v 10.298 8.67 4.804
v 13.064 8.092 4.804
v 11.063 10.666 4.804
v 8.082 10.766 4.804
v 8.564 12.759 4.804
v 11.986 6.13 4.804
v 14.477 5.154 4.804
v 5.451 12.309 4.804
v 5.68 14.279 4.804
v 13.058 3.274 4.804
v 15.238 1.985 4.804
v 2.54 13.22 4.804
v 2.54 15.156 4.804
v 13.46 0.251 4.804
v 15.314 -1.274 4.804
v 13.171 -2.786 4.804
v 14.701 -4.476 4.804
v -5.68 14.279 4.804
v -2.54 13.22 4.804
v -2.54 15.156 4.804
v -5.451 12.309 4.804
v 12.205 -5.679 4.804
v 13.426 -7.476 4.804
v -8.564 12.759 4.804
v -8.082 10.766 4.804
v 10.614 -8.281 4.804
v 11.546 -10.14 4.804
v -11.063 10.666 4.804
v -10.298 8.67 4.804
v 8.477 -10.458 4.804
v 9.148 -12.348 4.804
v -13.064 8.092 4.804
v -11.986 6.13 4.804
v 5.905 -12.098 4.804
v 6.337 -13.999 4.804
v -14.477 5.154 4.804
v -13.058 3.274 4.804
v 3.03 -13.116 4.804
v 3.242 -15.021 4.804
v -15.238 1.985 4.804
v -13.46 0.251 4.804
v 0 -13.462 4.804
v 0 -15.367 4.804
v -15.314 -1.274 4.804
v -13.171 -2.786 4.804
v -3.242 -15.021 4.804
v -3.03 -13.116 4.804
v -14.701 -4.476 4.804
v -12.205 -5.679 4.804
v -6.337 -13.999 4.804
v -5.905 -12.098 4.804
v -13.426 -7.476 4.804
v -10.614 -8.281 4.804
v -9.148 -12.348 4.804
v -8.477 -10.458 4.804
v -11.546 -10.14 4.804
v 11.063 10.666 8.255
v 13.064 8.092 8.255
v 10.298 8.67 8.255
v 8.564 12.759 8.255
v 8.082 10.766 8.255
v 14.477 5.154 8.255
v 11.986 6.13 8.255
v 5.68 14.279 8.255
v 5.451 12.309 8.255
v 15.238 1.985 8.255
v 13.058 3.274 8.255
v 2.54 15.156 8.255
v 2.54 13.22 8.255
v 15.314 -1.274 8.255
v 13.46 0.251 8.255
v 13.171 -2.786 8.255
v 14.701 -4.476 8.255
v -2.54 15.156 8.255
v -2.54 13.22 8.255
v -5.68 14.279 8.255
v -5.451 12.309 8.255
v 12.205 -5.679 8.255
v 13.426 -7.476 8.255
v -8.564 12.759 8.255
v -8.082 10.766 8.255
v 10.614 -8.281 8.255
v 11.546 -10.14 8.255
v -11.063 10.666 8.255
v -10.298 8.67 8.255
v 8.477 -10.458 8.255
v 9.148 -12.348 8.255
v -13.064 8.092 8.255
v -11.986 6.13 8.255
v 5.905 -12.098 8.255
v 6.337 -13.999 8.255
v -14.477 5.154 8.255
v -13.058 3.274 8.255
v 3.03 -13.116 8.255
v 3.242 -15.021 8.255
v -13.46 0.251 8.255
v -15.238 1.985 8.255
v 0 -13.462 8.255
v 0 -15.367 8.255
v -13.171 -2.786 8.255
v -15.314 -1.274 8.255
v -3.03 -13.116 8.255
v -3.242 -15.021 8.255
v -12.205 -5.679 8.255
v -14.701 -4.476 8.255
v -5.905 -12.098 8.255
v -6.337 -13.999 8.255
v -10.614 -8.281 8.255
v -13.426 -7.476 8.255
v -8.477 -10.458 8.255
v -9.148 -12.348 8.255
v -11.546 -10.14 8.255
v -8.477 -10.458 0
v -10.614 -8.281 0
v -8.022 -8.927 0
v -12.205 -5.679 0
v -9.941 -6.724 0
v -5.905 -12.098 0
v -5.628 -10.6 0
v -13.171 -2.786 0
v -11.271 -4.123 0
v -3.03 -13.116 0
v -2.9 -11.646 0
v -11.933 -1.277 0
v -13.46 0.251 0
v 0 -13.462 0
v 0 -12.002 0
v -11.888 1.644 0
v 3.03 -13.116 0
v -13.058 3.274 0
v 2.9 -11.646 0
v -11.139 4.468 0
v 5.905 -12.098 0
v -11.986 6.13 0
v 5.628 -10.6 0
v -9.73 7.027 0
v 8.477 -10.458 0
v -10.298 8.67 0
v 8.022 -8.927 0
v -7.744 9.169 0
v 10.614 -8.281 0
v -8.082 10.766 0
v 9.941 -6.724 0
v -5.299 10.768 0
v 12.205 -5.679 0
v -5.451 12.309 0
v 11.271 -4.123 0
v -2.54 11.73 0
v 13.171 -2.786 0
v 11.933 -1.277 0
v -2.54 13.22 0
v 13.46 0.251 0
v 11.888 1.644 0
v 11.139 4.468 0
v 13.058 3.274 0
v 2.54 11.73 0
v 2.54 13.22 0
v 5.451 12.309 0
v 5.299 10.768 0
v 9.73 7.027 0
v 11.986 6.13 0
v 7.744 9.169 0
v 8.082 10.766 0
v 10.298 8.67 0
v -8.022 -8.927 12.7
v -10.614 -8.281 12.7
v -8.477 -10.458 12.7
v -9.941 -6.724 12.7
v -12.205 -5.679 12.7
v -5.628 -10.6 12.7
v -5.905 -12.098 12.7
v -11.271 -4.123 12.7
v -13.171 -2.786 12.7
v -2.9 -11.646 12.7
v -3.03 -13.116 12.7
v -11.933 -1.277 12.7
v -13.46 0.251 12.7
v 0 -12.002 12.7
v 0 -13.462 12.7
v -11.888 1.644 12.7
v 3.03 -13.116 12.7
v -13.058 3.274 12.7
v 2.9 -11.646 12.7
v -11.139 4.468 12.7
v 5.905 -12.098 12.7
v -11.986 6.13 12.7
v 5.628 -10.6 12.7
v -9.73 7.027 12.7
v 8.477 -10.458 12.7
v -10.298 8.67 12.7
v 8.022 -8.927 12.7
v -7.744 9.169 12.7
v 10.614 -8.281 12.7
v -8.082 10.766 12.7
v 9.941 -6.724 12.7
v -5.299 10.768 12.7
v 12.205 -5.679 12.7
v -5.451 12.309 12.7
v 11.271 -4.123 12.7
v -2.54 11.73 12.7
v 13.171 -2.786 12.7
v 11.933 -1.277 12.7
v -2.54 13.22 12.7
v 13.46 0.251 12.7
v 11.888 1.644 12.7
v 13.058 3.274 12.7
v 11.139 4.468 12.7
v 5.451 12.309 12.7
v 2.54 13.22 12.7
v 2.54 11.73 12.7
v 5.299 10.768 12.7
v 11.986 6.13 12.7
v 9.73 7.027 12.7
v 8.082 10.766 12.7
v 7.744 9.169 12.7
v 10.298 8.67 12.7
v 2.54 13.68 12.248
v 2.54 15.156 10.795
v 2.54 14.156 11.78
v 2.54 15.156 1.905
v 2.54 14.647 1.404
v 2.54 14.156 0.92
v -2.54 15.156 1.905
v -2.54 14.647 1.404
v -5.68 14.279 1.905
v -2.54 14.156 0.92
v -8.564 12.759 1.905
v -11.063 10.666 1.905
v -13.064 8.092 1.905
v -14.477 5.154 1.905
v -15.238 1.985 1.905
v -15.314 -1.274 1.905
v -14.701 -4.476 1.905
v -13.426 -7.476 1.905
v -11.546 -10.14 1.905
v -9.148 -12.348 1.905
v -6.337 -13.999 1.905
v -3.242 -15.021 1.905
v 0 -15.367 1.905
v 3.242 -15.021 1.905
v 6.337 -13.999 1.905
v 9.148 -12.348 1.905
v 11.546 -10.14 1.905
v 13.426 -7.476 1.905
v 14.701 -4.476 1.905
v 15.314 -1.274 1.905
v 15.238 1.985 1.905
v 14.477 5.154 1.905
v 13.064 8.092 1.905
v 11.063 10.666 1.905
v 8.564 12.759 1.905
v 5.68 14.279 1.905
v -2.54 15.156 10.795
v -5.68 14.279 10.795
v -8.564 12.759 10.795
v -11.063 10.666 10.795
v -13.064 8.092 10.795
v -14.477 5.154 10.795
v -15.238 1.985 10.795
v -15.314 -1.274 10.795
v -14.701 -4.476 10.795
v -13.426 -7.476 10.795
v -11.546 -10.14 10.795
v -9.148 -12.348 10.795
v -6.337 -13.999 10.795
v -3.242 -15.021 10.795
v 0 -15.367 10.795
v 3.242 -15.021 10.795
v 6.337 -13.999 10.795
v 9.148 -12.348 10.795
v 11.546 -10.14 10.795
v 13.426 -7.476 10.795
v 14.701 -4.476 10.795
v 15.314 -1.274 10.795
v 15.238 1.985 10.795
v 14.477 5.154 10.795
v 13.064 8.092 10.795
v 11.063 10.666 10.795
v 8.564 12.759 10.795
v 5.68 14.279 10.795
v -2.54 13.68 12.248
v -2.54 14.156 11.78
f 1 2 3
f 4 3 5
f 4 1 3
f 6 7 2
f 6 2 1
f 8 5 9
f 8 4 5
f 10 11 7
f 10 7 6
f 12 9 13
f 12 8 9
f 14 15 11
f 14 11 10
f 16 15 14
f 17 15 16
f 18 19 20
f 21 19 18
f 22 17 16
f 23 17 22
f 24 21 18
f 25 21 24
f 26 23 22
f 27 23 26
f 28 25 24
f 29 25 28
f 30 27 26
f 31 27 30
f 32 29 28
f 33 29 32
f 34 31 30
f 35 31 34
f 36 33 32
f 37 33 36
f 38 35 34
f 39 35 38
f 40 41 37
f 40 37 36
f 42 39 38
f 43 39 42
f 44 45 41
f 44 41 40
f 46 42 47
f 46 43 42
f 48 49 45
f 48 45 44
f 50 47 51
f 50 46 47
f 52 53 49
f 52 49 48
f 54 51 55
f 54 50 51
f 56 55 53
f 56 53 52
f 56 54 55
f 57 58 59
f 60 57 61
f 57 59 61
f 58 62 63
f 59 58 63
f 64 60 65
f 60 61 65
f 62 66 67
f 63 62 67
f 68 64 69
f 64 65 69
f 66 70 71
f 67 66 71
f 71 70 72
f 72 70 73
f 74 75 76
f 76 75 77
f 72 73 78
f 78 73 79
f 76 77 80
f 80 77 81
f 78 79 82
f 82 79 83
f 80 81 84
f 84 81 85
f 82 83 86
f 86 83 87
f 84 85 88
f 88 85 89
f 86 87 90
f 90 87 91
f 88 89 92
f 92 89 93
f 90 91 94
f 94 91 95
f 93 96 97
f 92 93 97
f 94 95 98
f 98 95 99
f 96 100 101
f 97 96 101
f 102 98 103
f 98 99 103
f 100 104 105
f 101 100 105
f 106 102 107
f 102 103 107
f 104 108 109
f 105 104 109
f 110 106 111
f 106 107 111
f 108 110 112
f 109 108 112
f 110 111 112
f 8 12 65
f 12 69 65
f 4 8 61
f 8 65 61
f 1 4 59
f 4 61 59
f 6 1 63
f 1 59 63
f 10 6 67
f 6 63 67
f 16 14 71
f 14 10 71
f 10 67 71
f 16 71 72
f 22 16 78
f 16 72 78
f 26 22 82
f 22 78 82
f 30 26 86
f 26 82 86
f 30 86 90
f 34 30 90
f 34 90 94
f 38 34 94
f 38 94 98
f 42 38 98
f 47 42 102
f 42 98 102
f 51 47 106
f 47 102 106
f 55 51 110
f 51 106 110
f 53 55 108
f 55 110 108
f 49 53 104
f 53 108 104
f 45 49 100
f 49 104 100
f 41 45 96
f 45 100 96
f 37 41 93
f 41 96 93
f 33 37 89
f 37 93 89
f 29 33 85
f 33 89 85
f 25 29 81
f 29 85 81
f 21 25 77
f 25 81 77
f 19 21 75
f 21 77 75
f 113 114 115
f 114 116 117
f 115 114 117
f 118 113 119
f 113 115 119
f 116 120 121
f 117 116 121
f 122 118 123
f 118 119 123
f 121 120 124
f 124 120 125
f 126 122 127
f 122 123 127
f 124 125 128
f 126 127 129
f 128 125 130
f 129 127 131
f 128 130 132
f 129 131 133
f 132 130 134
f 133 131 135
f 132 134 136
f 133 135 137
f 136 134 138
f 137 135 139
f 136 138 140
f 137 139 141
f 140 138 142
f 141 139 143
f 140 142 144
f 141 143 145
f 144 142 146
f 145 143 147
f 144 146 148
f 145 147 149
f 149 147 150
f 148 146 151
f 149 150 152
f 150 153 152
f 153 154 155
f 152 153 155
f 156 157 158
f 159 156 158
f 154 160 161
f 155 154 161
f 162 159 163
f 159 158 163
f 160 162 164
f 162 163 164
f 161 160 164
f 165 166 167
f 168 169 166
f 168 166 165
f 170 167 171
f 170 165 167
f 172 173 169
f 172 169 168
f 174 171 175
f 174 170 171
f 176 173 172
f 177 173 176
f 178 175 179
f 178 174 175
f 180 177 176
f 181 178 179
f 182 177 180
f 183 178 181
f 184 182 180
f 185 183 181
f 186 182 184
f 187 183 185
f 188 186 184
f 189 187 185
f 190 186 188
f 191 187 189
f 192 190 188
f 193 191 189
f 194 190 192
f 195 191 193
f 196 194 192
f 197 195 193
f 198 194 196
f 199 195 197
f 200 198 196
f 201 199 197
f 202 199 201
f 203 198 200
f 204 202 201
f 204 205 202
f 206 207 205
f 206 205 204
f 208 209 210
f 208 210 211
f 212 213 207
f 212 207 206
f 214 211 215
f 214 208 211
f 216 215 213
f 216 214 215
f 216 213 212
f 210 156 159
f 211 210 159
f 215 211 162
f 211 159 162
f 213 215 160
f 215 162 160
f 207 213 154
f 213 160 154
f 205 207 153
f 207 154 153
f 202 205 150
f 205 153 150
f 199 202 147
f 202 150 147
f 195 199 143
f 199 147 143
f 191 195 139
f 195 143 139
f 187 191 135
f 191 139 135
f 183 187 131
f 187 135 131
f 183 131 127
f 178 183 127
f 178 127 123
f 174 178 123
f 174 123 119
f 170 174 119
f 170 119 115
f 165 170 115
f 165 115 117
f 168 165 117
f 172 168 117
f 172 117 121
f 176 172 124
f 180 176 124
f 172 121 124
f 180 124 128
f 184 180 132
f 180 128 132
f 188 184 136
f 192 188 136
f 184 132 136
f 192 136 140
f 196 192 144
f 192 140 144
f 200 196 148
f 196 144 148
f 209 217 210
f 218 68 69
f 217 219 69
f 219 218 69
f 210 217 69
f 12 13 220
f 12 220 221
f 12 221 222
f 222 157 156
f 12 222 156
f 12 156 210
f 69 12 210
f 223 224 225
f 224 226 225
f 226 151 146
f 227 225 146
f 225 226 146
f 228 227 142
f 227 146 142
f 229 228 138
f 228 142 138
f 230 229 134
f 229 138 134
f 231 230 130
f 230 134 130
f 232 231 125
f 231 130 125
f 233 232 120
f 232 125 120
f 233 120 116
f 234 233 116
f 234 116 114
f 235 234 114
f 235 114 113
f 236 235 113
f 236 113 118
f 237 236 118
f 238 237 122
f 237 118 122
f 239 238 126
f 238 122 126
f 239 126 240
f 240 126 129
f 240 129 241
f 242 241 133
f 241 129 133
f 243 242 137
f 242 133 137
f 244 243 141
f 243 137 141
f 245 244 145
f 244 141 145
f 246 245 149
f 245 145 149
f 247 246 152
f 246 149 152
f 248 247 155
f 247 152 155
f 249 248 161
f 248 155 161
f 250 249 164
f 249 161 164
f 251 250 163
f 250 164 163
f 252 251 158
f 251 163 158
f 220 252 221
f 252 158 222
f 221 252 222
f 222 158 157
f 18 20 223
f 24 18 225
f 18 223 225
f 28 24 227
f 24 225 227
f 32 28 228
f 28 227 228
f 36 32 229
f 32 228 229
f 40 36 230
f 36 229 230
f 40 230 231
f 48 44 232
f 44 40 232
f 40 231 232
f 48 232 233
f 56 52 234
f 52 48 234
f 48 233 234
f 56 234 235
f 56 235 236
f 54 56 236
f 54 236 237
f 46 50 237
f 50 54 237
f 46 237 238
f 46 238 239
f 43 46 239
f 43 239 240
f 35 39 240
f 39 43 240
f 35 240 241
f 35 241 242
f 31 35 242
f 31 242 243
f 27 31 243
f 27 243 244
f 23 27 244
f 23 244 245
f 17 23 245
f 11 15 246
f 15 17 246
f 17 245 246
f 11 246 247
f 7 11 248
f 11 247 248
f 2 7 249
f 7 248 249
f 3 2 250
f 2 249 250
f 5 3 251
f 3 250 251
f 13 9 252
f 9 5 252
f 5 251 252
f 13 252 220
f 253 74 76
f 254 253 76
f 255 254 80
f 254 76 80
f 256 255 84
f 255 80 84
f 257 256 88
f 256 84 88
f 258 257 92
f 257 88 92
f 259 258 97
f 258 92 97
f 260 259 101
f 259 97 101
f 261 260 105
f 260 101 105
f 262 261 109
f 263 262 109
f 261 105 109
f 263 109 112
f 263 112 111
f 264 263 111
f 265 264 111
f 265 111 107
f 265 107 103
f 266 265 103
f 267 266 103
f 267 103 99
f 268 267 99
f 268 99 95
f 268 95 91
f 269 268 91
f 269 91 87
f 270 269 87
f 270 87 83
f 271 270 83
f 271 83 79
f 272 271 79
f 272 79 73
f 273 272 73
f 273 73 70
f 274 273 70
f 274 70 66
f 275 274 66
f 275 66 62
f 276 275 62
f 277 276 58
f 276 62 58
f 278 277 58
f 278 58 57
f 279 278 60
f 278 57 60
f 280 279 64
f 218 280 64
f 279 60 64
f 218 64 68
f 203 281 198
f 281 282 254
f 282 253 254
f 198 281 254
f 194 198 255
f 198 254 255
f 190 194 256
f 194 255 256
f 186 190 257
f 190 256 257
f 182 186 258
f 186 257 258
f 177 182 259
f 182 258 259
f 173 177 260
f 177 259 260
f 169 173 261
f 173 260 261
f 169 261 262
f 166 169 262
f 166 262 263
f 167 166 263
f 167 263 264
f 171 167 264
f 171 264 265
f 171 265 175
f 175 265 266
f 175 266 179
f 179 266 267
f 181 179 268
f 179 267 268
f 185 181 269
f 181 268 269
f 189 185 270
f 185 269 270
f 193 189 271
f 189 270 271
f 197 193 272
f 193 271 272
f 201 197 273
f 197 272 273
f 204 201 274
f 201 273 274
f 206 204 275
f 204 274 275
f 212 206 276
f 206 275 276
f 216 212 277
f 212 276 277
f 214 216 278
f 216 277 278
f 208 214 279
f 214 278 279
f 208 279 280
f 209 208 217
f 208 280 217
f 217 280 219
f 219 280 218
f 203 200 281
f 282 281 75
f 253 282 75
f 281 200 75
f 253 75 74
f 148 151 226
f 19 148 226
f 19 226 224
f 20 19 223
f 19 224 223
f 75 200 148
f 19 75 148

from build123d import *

# Parameters (mm, degrees)
F1_DEPTH = 12.7
F2_W     = 2.116344
F2_H     = 3.450806
F4_SIZE  = 1.905


with BuildPart() as f1:
    # F0 (on Top) → F1 (new body)
    with BuildSketch(Plane.XY):
        with BuildLine():
            ThreePointArc((2.54, 11.729638), (0, -12.0015), (-2.54, 11.729638))
            Line((-2.54, 11.729638), (-2.54, 15.155629))
            ThreePointArc((-2.54, 15.155629), (0, -15.367), (2.54, 15.155629))
            Line((2.54, 15.155629), (2.54, 11.729638))
        make_face()
    extrude(amount=F1_DEPTH)

    # F2 (on Front) → F3 (revolve, cut)
    with BuildSketch(Plane.XZ):
        with Locations((14.520172, 6.529597)):
            Rectangle(F2_W, F2_H)
    revolve(axis=Axis((0, 0, 7.00403), (0, 0, -1)), mode=Mode.SUBTRACT)

    # F4
    f4_edges = [f1.edges().sort_by_distance(p)[0] for p in [
        (0, -15.367, 12.7),
        (0, -15.367, 0),
    ]]
    chamfer(f4_edges, length=F4_SIZE)


solid = f1.part
